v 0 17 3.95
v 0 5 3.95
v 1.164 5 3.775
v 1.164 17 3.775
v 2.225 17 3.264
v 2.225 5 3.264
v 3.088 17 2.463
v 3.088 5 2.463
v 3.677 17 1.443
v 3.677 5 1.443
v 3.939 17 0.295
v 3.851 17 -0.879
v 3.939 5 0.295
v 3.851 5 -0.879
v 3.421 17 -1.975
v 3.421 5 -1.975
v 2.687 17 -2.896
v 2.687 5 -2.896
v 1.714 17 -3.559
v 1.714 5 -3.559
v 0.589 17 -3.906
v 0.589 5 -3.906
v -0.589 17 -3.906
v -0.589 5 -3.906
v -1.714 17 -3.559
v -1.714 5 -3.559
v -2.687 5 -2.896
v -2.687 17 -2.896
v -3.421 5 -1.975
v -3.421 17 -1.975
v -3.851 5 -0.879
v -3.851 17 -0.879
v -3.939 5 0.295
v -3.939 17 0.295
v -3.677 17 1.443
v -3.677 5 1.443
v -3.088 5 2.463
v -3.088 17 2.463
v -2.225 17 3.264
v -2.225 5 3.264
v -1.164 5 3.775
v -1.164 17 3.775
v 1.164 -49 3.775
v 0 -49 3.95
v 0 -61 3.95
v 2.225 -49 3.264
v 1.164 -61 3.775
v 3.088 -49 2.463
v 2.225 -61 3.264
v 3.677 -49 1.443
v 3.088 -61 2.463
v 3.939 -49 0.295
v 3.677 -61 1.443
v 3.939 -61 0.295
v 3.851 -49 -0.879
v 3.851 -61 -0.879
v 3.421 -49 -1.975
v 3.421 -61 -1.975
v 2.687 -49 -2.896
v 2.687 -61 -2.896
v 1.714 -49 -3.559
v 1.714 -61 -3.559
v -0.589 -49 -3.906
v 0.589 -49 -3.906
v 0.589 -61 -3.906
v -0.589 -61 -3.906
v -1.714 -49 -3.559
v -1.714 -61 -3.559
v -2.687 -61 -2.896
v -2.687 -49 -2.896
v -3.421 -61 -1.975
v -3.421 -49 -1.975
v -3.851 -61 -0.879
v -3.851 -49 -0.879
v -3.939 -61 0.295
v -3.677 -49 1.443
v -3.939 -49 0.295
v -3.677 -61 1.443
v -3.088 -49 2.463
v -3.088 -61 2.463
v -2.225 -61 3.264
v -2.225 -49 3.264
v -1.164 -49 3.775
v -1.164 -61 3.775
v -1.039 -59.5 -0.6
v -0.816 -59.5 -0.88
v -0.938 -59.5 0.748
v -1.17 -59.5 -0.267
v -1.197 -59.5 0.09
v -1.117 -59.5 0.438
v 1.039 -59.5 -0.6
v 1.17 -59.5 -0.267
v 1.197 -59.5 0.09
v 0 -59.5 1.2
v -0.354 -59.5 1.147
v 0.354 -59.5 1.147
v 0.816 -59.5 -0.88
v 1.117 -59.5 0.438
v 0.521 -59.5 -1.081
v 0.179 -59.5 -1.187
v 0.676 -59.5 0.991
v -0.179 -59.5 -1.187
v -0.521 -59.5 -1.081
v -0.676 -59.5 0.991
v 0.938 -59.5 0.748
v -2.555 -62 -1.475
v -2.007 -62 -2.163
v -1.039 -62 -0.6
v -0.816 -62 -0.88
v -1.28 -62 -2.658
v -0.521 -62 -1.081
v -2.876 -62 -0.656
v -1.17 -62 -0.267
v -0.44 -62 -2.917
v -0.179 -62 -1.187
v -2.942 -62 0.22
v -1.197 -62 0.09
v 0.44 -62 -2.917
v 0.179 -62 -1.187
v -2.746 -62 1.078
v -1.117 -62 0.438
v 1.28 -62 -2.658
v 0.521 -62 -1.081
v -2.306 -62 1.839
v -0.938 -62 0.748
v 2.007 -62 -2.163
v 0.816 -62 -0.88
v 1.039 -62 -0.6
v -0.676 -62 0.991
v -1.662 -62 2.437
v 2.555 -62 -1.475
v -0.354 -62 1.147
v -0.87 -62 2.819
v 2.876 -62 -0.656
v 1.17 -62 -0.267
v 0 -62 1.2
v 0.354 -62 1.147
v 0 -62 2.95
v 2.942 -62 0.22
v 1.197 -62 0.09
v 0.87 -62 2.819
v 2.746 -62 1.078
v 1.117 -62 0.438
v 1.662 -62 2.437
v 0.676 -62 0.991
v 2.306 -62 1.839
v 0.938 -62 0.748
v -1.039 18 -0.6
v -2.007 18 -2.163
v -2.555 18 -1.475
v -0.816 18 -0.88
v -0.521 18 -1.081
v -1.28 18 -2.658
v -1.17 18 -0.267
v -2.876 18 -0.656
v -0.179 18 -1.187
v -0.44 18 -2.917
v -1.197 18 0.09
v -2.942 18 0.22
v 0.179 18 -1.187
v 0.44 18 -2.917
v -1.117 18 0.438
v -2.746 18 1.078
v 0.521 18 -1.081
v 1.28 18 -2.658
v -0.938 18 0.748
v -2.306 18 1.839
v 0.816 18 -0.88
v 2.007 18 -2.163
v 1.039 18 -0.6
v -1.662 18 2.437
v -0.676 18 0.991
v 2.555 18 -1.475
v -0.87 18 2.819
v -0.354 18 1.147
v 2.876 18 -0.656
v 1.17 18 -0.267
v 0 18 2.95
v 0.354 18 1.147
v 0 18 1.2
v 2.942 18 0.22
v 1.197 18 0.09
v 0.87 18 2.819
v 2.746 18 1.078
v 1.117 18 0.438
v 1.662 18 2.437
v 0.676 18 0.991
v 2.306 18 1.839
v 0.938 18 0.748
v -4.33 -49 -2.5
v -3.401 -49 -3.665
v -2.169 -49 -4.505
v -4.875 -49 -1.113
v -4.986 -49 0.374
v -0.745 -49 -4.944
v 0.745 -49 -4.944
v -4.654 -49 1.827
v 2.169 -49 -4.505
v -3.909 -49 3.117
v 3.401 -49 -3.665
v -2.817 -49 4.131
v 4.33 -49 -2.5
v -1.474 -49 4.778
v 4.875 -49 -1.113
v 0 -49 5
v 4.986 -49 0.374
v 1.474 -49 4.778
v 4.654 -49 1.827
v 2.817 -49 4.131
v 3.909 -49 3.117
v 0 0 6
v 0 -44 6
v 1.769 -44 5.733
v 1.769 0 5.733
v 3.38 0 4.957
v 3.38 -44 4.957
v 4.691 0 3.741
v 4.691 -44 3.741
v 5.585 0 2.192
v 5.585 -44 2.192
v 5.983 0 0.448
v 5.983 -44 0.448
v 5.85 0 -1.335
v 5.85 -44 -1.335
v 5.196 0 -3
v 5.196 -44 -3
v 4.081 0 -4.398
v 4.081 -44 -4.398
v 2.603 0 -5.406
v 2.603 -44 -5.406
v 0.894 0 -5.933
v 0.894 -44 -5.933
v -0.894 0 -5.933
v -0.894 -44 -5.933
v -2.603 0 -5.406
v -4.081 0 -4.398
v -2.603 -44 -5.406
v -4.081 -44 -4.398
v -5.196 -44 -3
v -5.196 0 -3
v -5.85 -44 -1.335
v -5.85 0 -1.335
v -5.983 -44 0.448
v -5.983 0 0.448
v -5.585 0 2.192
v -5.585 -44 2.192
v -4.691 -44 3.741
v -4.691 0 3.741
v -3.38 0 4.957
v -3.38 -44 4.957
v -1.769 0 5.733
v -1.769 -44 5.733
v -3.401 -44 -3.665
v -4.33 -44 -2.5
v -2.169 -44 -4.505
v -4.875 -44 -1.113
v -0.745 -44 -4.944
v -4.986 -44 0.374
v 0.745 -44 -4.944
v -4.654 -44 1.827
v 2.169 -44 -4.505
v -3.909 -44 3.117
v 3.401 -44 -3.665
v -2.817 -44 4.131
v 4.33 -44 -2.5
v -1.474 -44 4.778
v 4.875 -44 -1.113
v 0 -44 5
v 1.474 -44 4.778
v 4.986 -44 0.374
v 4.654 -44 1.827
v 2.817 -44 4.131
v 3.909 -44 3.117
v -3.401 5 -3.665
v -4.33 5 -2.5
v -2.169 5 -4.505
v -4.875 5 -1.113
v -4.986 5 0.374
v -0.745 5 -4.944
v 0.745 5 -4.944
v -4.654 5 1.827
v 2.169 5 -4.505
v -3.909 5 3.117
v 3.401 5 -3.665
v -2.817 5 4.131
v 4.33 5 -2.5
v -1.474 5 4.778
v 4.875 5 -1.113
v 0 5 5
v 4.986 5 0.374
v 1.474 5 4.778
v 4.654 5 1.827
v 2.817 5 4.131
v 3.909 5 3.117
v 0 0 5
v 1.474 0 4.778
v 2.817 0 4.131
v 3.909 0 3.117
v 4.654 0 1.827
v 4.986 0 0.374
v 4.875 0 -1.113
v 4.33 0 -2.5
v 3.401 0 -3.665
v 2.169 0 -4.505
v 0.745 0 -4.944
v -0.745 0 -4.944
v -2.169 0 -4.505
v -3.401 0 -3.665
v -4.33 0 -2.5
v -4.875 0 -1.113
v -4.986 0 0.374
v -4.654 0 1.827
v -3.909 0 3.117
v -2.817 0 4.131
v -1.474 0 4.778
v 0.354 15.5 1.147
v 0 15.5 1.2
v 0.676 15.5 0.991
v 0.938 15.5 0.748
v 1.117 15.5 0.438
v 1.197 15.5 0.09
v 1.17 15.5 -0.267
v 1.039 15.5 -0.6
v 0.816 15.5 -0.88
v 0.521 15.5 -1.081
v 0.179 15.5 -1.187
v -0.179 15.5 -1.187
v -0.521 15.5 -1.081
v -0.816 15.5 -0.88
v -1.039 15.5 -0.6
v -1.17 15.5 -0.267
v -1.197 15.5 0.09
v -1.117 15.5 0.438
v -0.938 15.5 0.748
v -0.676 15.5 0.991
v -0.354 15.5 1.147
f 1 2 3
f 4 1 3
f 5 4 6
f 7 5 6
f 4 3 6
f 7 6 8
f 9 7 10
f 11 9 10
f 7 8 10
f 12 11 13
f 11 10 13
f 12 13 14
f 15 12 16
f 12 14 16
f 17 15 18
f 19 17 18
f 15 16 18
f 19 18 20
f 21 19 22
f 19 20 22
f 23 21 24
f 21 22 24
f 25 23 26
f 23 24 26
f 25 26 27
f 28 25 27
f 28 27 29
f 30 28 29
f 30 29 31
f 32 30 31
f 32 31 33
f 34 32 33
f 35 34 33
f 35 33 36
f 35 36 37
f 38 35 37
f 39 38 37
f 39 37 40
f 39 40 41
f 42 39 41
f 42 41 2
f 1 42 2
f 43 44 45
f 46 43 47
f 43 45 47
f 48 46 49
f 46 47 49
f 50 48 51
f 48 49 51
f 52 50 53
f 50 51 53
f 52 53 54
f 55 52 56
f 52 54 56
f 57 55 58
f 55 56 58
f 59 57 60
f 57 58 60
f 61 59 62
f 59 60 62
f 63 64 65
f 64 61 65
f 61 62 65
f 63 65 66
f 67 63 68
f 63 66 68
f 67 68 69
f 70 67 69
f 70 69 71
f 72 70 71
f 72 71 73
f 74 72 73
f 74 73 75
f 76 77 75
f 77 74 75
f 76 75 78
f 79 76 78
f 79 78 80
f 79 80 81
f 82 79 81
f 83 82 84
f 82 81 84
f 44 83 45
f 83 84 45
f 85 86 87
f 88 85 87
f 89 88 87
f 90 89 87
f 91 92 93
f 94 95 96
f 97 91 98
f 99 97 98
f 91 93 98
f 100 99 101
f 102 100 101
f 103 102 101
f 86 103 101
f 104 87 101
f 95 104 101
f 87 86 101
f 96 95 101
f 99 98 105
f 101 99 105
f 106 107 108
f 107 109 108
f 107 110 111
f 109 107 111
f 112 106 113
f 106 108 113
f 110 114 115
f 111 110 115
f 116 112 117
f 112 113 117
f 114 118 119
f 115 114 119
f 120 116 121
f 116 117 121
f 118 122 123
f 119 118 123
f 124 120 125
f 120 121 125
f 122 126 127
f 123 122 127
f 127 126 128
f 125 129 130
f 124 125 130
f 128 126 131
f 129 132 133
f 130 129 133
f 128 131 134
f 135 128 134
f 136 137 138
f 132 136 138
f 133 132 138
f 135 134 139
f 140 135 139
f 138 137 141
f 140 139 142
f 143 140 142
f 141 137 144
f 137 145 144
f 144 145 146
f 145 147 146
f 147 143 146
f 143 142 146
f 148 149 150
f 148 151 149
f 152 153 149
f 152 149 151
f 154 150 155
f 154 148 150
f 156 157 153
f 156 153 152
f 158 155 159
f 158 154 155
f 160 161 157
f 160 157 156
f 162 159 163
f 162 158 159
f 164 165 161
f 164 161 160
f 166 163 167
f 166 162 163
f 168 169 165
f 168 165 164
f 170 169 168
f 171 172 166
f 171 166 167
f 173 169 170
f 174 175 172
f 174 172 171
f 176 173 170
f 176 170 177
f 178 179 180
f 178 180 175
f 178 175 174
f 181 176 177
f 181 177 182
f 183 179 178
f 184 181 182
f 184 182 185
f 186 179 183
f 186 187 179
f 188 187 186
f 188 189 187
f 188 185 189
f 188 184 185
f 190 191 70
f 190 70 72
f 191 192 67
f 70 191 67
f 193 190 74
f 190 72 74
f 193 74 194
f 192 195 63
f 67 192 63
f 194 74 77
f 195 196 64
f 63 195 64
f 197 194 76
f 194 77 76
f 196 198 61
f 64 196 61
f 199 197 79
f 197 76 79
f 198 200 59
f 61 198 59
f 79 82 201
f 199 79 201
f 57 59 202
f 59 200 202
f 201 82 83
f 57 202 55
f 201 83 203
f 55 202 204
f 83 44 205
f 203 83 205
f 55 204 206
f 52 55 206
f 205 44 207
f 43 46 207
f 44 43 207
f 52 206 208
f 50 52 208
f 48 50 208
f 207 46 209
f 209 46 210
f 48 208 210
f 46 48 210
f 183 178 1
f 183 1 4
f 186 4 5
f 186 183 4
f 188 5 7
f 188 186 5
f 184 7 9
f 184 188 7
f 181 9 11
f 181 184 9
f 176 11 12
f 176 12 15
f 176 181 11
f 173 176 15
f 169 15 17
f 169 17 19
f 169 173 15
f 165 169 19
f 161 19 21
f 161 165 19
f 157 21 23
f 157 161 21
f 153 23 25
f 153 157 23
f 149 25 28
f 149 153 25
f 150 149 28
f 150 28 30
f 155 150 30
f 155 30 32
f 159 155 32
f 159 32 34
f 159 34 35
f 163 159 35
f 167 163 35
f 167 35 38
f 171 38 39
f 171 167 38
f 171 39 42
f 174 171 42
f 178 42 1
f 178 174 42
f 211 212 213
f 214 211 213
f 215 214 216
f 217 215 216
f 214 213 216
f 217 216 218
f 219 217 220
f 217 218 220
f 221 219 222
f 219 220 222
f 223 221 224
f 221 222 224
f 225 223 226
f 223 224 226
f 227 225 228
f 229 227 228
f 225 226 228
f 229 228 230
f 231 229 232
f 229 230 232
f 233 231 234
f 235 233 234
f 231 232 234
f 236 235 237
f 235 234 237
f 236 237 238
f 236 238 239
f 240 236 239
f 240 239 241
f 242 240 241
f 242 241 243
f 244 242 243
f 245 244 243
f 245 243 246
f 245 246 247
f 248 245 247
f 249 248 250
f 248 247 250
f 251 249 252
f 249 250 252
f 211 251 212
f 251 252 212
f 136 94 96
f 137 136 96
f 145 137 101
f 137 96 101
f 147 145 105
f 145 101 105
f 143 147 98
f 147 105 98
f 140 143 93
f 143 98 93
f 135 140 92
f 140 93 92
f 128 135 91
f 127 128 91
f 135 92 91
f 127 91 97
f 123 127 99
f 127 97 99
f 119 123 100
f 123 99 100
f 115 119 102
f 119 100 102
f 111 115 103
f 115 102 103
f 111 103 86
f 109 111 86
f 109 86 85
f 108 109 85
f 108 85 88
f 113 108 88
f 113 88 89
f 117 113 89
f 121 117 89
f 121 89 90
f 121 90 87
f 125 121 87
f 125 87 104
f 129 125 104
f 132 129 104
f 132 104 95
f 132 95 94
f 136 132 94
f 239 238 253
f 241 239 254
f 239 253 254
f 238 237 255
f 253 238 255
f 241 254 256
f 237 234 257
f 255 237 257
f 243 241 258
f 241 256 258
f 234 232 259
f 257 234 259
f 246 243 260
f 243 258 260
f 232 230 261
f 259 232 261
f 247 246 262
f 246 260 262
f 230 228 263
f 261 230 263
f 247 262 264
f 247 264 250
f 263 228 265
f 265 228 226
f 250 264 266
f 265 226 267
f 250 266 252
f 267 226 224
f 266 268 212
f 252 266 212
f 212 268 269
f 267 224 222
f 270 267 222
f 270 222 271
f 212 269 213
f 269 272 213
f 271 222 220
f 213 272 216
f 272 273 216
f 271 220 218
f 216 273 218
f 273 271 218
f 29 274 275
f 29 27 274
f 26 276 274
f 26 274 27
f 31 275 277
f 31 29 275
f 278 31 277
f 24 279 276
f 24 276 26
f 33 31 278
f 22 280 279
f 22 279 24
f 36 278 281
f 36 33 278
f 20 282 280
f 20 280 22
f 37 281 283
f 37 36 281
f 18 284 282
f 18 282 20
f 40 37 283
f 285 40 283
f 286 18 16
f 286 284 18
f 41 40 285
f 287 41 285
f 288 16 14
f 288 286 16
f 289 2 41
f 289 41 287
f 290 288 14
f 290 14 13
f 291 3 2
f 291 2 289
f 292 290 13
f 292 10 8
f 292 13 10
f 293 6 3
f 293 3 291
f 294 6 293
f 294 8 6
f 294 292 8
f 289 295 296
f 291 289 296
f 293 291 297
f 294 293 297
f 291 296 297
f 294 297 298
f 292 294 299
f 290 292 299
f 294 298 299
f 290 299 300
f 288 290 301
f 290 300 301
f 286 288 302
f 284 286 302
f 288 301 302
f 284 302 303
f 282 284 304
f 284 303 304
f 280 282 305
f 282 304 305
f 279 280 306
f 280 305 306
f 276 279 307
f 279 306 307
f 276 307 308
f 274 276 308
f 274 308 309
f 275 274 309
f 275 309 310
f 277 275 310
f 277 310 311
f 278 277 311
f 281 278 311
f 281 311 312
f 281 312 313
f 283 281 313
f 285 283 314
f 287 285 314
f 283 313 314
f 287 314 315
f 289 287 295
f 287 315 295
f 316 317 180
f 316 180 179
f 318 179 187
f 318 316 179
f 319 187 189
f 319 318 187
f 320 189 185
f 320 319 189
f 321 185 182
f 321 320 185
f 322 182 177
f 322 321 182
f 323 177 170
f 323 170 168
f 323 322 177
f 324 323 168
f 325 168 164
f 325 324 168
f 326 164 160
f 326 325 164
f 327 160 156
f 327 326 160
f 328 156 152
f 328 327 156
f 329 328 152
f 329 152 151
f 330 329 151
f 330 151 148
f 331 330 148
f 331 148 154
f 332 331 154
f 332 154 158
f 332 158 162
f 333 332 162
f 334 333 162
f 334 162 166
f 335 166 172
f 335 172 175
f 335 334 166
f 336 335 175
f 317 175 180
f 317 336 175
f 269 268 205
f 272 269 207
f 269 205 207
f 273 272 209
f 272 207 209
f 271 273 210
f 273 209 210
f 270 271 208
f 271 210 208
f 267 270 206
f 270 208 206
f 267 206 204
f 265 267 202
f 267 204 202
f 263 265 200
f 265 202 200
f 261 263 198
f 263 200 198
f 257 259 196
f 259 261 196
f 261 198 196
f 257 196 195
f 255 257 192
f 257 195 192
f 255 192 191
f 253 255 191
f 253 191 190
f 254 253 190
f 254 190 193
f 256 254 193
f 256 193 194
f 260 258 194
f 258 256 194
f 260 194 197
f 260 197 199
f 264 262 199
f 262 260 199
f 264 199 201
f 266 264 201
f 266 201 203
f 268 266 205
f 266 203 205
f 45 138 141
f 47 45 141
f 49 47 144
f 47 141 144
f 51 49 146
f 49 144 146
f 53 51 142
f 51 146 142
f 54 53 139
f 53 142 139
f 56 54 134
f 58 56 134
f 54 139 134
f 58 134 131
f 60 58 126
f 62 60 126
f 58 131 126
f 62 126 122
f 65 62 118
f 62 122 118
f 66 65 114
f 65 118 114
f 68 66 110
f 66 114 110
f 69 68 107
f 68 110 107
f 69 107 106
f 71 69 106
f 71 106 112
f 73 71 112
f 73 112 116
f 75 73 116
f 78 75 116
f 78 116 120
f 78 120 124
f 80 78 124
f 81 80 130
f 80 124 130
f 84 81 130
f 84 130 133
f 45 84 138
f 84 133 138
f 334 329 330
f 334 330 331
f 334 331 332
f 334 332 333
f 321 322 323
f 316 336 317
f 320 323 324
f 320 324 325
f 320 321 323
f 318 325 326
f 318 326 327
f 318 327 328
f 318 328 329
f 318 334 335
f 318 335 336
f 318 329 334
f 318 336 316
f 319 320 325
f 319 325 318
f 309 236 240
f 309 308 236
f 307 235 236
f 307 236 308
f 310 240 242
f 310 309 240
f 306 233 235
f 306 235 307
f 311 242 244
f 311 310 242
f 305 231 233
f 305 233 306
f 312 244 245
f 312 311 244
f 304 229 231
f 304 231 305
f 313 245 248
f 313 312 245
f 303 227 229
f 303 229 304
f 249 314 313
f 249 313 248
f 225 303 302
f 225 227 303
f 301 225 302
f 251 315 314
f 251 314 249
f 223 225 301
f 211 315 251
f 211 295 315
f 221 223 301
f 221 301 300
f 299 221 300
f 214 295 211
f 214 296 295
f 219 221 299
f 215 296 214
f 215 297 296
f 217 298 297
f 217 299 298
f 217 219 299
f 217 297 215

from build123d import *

# Parameters (mm, degrees)
SKETCH4_R           = 3.95
BOSS_EXTRUDE2_DEPTH = 18
CUT_EXTRUDE2_START  = 15.5
SKETCH4_3_R         = 1.2
CUT_EXTRUDE2_DEPTH  = 2.5
SKETCH4_4_R         = 5
SKETCH4_4_R_2       = 3.95
BOSS_EXTRUDE3_DEPTH = 5
SKETCH4_5_R         = 6
BOSS_EXTRUDE4_DEPTH = 44
BOSS_EXTRUDE8_START = -49
SKETCH4_10_R        = 5
BOSS_EXTRUDE8_DEPTH = 49
BOSS_EXTRUDE9_START = -62
SKETCH4_11_R        = 3.95
BOSS_EXTRUDE9_DEPTH = 62
CUT_EXTRUDE3_START  = -59.5
SKETCH4_13_R        = 1.2
CUT_EXTRUDE3_DEPTH  = 4.077951389
CHAMFER3_SIZE       = 1


with BuildPart() as part:
    # Sketch4 → Boss-Extrude2 (new body)
    with BuildSketch(Plane(origin=(0, 0, 0), x_dir=(1, 0, 0), z_dir=(0, 1, 0))):
        Circle(SKETCH4_R)
    extrude(amount=BOSS_EXTRUDE2_DEPTH)

    # Sketch4<3> → Cut-Extrude2 (cut)
    with BuildSketch(Plane(origin=(0, 0, 0), x_dir=(1, 0, 0), z_dir=(0, 1, 0)).offset(CUT_EXTRUDE2_START)):
        Circle(SKETCH4_3_R)
    extrude(amount=CUT_EXTRUDE2_DEPTH, mode=Mode.SUBTRACT)

    # Sketch4<4> → Boss-Extrude3 (add)
    with BuildSketch(Plane(origin=(0, 0, 0), x_dir=(1, 0, 0), z_dir=(0, 1, 0))):
        Circle(SKETCH4_4_R)
        Circle(SKETCH4_4_R_2, mode=Mode.SUBTRACT)
    extrude(amount=BOSS_EXTRUDE3_DEPTH)

    # Sketch4<5> → Boss-Extrude4 (add)
    with BuildSketch(Plane(origin=(0, 0, 0), x_dir=(1, 0, 0), z_dir=(0, 1, 0))):
        Circle(SKETCH4_5_R)
    extrude(amount=-BOSS_EXTRUDE4_DEPTH)

    # Sketch4<10> → Boss-Extrude8 (add)
    with BuildSketch(Plane(origin=(0, 0, 0), x_dir=(1, 0, 0), z_dir=(0, 1, 0)).offset(BOSS_EXTRUDE8_START)):
        Circle(SKETCH4_10_R)
    extrude(amount=BOSS_EXTRUDE8_DEPTH)

    # Sketch4<11> → Boss-Extrude9 (add)
    with BuildSketch(Plane(origin=(0, 0, 0), x_dir=(1, 0, 0), z_dir=(0, 1, 0)).offset(BOSS_EXTRUDE9_START)):
        Circle(SKETCH4_11_R)
    extrude(amount=BOSS_EXTRUDE9_DEPTH)

    # Sketch4<13> → Cut-Extrude3 (cut, through all)
    with BuildSketch(Plane(origin=(0, 0, 0), x_dir=(1, 0, 0), z_dir=(0, 1, 0)).offset(CUT_EXTRUDE3_START)):
        Circle(SKETCH4_13_R)
    extrude(amount=-CUT_EXTRUDE3_DEPTH, mode=Mode.SUBTRACT)

    # Chamfer3
    chamfer3_edges = [part.edges().sort_by_distance(p)[0] for p in [
        (-3.95, 18, 0),
        (-3.95, -62, 0),
    ]]
    chamfer(chamfer3_edges, length=CHAMFER3_SIZE)


solid = part.part
